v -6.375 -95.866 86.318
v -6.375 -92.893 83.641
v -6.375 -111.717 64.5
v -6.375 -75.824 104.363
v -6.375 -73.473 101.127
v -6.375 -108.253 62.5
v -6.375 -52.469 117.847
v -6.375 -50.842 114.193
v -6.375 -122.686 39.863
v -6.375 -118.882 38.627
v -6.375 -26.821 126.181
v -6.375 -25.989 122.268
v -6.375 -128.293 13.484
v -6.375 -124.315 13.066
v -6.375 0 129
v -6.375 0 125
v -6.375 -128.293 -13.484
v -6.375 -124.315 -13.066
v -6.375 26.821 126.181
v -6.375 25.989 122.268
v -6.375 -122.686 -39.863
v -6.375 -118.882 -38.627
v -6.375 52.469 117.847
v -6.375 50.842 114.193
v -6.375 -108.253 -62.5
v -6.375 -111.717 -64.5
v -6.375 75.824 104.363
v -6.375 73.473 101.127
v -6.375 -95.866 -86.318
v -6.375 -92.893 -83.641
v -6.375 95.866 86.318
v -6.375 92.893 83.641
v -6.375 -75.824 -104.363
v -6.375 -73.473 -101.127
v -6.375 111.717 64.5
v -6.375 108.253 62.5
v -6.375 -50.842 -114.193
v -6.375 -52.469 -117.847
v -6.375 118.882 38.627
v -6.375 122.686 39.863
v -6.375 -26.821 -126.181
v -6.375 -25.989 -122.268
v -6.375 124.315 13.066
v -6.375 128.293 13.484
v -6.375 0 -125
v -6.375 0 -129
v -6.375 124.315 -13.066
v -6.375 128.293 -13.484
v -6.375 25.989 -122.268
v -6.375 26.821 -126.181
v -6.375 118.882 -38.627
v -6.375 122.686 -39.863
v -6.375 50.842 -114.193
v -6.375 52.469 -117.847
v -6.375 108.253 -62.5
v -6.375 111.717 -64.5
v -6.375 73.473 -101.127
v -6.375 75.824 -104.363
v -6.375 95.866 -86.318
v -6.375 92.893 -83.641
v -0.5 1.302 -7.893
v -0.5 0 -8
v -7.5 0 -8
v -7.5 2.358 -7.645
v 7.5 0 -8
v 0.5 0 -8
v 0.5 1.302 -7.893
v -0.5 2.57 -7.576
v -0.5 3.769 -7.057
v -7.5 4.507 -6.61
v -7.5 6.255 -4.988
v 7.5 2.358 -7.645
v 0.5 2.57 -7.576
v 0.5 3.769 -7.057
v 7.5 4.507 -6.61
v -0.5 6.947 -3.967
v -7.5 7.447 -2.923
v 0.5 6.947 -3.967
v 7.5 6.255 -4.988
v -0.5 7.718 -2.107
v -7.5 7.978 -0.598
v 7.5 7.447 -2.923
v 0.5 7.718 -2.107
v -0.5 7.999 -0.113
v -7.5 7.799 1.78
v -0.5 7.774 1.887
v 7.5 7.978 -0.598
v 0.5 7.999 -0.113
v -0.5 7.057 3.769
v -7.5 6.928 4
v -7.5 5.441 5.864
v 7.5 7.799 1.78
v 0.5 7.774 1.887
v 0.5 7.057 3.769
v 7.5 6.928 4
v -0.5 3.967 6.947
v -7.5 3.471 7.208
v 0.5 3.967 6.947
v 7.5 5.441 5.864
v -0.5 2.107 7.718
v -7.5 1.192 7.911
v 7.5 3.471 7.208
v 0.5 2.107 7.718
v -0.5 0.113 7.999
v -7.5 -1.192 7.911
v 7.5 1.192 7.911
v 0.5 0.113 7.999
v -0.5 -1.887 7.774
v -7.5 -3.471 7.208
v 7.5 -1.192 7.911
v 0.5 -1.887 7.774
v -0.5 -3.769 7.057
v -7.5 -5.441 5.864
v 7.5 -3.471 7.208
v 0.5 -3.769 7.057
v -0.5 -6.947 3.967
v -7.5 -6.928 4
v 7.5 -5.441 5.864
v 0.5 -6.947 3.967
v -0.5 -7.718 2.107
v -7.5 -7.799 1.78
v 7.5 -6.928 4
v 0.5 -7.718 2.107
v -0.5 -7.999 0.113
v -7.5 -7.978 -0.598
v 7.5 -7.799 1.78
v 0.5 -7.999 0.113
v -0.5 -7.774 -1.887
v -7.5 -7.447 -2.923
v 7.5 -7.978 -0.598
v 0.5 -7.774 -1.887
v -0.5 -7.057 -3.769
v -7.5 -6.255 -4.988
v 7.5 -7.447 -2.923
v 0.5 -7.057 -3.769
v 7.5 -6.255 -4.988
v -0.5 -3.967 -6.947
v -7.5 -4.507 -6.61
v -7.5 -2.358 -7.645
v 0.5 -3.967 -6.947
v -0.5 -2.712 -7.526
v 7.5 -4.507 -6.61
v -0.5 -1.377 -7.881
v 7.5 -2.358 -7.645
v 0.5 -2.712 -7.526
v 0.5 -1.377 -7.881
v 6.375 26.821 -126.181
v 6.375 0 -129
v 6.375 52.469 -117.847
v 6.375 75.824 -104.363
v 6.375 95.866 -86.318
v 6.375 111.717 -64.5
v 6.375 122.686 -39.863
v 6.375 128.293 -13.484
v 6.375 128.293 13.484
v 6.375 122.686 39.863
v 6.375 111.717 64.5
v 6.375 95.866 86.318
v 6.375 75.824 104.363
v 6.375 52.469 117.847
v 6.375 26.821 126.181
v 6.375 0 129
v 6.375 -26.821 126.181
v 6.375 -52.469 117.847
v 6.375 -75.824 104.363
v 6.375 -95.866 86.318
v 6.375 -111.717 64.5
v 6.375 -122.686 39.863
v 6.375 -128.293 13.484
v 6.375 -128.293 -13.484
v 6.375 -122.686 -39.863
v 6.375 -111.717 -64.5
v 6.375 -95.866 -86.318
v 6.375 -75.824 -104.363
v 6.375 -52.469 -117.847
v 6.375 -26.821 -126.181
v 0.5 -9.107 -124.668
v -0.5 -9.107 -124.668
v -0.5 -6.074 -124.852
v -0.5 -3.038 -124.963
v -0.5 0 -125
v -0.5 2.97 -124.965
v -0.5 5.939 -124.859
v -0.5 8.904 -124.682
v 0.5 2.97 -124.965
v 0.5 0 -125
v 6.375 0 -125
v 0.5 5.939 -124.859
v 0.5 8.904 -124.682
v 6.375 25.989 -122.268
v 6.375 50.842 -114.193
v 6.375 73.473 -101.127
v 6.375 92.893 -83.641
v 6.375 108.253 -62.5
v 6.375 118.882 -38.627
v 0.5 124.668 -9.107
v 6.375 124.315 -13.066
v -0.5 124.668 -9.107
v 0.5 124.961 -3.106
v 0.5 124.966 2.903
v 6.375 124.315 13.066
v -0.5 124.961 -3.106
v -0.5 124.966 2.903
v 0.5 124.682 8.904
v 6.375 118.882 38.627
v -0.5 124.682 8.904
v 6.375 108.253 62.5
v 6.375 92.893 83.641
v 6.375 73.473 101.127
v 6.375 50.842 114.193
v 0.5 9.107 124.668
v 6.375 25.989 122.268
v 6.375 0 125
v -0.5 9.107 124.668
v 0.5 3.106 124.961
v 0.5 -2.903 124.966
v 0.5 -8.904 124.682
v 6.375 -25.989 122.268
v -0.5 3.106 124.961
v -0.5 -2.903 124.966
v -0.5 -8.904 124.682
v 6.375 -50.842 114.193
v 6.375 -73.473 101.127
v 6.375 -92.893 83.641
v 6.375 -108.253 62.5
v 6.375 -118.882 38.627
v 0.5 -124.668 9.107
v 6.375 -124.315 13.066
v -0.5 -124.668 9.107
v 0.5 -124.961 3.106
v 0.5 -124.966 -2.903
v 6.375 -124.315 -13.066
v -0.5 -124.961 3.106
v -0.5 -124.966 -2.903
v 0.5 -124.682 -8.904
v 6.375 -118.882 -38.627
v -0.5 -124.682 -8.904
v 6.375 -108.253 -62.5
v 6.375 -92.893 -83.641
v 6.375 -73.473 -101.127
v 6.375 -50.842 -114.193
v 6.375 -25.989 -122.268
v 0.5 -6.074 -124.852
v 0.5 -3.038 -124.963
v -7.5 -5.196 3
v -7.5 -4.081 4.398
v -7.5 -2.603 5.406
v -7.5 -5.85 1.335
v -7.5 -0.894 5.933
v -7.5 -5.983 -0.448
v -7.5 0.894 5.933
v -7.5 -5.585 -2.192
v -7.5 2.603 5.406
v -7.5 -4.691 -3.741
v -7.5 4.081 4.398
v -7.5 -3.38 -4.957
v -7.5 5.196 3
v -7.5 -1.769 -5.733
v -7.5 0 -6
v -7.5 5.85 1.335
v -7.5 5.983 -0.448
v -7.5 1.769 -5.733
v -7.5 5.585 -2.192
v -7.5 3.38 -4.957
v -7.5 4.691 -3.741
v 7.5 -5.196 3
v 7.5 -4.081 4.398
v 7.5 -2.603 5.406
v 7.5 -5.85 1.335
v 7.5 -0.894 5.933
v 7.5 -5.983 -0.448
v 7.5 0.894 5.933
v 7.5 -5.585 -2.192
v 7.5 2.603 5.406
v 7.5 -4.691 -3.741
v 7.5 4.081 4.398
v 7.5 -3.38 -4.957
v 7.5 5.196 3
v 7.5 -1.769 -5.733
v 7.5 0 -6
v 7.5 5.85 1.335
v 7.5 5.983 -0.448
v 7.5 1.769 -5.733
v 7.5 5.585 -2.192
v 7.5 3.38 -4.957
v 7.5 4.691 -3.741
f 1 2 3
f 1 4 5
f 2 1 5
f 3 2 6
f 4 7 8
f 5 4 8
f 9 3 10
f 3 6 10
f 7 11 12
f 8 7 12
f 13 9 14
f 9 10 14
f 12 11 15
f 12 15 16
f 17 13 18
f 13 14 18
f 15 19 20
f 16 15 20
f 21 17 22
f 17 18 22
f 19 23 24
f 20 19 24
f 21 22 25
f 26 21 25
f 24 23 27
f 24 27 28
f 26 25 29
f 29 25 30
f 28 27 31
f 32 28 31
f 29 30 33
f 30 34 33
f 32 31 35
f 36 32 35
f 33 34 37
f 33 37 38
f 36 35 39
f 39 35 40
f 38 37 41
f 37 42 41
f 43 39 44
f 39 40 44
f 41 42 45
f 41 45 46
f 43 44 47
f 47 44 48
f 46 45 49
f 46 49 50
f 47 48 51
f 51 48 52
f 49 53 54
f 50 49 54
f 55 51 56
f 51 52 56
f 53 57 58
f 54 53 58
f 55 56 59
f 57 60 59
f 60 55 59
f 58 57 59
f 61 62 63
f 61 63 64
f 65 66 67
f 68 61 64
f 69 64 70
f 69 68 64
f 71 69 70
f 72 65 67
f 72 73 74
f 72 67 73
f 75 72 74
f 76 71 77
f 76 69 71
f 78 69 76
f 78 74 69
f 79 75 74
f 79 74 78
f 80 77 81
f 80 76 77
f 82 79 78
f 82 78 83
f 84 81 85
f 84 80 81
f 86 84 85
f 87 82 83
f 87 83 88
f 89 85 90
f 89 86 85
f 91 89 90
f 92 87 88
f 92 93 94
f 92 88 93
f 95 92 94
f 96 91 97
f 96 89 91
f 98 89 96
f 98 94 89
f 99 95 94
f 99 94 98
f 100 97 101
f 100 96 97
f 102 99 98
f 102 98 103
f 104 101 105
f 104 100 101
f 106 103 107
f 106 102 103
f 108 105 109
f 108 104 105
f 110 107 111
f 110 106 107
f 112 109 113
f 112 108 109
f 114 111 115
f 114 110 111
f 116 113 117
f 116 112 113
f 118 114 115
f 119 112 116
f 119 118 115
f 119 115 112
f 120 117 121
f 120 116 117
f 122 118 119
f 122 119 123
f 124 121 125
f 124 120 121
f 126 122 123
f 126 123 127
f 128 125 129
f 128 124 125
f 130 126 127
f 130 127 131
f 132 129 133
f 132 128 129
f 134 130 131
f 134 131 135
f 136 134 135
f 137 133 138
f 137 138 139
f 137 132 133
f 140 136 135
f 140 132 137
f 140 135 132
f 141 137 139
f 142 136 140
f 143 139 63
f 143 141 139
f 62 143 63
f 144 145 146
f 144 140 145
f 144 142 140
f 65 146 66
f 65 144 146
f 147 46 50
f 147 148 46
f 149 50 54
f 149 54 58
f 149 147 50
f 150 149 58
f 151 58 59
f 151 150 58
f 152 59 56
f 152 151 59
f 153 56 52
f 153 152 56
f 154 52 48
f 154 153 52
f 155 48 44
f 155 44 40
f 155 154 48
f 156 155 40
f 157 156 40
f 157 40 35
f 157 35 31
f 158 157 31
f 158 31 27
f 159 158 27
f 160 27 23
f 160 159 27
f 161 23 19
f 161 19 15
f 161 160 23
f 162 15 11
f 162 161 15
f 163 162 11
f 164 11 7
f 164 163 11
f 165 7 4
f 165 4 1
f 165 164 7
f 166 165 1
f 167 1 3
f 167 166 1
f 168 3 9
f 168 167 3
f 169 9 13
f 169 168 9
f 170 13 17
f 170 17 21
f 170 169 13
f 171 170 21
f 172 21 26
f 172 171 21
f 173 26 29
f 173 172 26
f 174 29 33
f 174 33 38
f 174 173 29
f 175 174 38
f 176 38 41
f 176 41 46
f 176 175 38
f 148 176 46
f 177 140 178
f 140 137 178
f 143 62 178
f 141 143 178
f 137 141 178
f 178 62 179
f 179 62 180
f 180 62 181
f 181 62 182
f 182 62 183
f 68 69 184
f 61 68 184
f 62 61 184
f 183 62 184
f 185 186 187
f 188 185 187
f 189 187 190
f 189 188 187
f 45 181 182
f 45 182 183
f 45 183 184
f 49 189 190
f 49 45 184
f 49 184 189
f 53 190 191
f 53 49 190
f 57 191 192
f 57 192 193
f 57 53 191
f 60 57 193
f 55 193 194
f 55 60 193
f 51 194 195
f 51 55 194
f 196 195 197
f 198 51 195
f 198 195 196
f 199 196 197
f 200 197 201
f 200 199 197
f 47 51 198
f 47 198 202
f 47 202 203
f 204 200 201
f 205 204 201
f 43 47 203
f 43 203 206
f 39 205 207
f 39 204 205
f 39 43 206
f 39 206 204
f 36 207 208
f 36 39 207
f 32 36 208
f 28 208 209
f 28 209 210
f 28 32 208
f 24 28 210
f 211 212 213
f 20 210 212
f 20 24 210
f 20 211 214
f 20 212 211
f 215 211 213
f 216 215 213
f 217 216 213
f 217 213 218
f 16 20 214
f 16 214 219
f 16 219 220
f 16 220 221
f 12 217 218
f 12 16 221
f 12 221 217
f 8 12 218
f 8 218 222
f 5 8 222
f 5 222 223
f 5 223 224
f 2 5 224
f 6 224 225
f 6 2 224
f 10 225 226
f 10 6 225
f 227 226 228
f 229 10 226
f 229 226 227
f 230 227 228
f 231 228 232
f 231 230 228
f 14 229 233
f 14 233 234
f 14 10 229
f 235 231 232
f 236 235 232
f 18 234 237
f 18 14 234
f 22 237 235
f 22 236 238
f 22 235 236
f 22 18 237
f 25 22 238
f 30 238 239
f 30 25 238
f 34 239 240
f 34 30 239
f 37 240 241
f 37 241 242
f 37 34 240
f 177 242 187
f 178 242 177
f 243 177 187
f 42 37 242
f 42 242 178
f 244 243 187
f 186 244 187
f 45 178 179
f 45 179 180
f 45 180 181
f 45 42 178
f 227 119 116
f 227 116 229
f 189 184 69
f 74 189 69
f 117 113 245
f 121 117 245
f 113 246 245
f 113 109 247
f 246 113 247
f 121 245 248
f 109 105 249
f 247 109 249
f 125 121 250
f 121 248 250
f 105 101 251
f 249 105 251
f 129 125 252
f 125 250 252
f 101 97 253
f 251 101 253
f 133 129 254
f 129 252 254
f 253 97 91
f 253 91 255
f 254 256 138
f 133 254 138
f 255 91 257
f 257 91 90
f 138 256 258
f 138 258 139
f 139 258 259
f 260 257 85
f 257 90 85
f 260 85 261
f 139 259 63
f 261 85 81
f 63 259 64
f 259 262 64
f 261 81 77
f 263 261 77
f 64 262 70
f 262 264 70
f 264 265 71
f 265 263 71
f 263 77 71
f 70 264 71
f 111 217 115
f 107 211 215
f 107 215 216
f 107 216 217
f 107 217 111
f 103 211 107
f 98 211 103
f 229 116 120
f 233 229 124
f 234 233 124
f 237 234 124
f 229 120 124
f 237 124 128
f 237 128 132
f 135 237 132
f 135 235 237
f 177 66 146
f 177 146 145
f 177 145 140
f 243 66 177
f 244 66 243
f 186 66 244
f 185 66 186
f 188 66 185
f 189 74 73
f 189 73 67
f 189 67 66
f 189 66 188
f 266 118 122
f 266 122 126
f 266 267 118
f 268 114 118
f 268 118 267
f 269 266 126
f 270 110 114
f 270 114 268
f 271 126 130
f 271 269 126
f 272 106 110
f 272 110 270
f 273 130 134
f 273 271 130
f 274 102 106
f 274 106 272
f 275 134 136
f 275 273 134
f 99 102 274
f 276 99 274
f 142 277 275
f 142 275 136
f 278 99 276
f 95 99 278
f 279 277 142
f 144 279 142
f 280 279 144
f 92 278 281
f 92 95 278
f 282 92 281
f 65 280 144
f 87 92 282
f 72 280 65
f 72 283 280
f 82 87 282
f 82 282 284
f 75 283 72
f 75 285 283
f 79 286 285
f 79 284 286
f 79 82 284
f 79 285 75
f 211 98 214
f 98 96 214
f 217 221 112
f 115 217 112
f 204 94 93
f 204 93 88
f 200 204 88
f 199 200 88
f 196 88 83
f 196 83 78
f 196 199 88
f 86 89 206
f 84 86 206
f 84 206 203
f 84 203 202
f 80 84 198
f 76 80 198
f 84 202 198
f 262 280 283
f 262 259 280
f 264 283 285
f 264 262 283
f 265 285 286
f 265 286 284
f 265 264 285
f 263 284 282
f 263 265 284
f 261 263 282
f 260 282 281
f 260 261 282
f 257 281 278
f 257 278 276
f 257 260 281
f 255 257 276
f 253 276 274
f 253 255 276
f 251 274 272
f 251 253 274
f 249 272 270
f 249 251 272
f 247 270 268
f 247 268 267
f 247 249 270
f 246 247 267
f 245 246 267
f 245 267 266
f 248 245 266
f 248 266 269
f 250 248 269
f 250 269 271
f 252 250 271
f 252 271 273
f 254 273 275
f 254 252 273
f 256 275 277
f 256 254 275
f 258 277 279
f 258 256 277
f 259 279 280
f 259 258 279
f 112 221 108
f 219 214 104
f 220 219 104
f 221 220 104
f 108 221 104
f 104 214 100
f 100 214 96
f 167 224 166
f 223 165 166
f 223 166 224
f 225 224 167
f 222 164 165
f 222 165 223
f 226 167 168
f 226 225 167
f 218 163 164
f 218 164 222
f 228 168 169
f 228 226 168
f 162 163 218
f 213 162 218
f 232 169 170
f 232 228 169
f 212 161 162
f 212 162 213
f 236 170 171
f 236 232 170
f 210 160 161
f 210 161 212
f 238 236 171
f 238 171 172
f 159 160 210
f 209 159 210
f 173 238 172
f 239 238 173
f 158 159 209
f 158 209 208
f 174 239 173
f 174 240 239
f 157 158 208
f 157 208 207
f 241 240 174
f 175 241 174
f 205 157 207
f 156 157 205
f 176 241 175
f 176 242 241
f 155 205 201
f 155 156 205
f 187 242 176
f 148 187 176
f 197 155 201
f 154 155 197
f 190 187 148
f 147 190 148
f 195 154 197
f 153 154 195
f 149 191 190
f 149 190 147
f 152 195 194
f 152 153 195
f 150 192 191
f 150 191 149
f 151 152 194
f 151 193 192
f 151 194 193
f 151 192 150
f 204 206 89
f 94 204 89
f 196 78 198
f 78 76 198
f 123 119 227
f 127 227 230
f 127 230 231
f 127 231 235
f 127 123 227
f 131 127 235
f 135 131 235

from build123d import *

# Parameters (mm, degrees)
SKETCH1_R           = 129
SKETCH1_R_2         = 125
BOSS_EXTRUDE1_DEPTH = 6.375
BOSS_EXTRUDE2_DEPTH = 0.5
SKETCH2_4_R         = 6
BOSS_EXTRUDE3_DEPTH = 7.5


with BuildPart() as part:
    # Sketch1 → Boss-Extrude1 (new, symmetric)
    with BuildSketch(Plane(origin=(0, 0, 0), x_dir=(0, 0, -1), z_dir=(1, 0, 0))):
        Circle(SKETCH1_R)
        Circle(SKETCH1_R_2, mode=Mode.SUBTRACT)
    extrude(amount=BOSS_EXTRUDE1_DEPTH, both=True)

    # Sketch2 → Boss-Extrude2 (add, symmetric)
    with BuildSketch(Plane(origin=(0, 0, 0), x_dir=(0, 0, -1), z_dir=(1, 0, 0))):
        with BuildLine():
            ThreePointArc((-3.768738548, 7.056671294), (0.113394951, 7.999196309), (3.9672518, 6.947007496))
            Line((3.9672518, 6.947007496), (9.107052817, 124.667804942))
            ThreePointArc((9.107052817, 124.667804942), (0.101595075, 124.999958714), (-8.904390692, 124.682443938))
            Line((-8.904390692, 124.682443938), (-3.768738548, 7.056671294))
        make_face()
        with BuildLine():
            Line((124.682443938, 8.904390692), (7.056671294, 3.768738548))
            ThreePointArc((7.056671294, 3.768738548), (7.999196309, -0.113394951), (6.947007496, -3.9672518))
            Line((6.947007496, -3.9672518), (124.667804942, -9.107052817))
            ThreePointArc((124.667804942, -9.107052817), (124.999958714, -0.101595075), (124.682443938, 8.904390692))
        make_face()
        with BuildLine():
            ThreePointArc((-7.056671294, -3.768738548), (-7.999196309, 0.113394951), (-6.947007496, 3.9672518))
            Line((-6.947007496, 3.9672518), (-124.667804942, 9.107052817))
            ThreePointArc((-124.667804942, 9.107052817), (-124.999958714, 0.101595075), (-124.682443938, -8.904390692))
            Line((-124.682443938, -8.904390692), (-7.056671294, -3.768738548))
        make_face()
        with BuildLine():
            Line((8.904390692, -124.682443938), (3.768738548, -7.056671294))
            ThreePointArc((3.768738548, -7.056671294), (-0.113394951, -7.999196309), (-3.9672518, -6.947007496))
            Line((-3.9672518, -6.947007496), (-9.107052817, -124.667804942))
            ThreePointArc((-9.107052817, -124.667804942), (-0.101595075, -124.999958714), (8.904390692, -124.682443938))
        make_face()
    extrude(amount=BOSS_EXTRUDE2_DEPTH, both=True)

    # Sketch2<4> → Boss-Extrude3 (add, symmetric)
    with BuildSketch(Plane(origin=(0, 0, 0), x_dir=(0, 0, -1), z_dir=(1, 0, 0))):
        with BuildLine():
            ThreePointArc((7.056671294, 3.768738548), (5.736468293, 5.576103615), (3.9672518, 6.947007496))
            ThreePointArc((3.9672518, 6.947007496), (0.113394951, 7.999196309), (-3.768738548, 7.056671294))
            ThreePointArc((-3.768738548, 7.056671294), (-5.576103615, 5.736468293), (-6.947007496, 3.9672518))
            ThreePointArc((-6.947007496, 3.9672518), (-7.999196309, 0.113394951), (-7.056671294, -3.768738548))
            ThreePointArc((-7.056671294, -3.768738548), (-5.736468293, -5.576103615), (-3.9672518, -6.947007496))
            ThreePointArc((-3.9672518, -6.947007496), (-0.113394951, -7.999196309), (3.768738548, -7.056671294))
            ThreePointArc((3.768738548, -7.056671294), (5.576103615, -5.736468293), (6.947007496, -3.9672518))
            ThreePointArc((6.947007496, -3.9672518), (7.732271981, -2.05230846), (8, 0))
            ThreePointArc((8, 0), (7.760585363, 1.942502207), (7.056671294, 3.768738548))
        make_face()
        Circle(SKETCH2_4_R, mode=Mode.SUBTRACT)
    extrude(amount=BOSS_EXTRUDE3_DEPTH, both=True)


solid = part.part
